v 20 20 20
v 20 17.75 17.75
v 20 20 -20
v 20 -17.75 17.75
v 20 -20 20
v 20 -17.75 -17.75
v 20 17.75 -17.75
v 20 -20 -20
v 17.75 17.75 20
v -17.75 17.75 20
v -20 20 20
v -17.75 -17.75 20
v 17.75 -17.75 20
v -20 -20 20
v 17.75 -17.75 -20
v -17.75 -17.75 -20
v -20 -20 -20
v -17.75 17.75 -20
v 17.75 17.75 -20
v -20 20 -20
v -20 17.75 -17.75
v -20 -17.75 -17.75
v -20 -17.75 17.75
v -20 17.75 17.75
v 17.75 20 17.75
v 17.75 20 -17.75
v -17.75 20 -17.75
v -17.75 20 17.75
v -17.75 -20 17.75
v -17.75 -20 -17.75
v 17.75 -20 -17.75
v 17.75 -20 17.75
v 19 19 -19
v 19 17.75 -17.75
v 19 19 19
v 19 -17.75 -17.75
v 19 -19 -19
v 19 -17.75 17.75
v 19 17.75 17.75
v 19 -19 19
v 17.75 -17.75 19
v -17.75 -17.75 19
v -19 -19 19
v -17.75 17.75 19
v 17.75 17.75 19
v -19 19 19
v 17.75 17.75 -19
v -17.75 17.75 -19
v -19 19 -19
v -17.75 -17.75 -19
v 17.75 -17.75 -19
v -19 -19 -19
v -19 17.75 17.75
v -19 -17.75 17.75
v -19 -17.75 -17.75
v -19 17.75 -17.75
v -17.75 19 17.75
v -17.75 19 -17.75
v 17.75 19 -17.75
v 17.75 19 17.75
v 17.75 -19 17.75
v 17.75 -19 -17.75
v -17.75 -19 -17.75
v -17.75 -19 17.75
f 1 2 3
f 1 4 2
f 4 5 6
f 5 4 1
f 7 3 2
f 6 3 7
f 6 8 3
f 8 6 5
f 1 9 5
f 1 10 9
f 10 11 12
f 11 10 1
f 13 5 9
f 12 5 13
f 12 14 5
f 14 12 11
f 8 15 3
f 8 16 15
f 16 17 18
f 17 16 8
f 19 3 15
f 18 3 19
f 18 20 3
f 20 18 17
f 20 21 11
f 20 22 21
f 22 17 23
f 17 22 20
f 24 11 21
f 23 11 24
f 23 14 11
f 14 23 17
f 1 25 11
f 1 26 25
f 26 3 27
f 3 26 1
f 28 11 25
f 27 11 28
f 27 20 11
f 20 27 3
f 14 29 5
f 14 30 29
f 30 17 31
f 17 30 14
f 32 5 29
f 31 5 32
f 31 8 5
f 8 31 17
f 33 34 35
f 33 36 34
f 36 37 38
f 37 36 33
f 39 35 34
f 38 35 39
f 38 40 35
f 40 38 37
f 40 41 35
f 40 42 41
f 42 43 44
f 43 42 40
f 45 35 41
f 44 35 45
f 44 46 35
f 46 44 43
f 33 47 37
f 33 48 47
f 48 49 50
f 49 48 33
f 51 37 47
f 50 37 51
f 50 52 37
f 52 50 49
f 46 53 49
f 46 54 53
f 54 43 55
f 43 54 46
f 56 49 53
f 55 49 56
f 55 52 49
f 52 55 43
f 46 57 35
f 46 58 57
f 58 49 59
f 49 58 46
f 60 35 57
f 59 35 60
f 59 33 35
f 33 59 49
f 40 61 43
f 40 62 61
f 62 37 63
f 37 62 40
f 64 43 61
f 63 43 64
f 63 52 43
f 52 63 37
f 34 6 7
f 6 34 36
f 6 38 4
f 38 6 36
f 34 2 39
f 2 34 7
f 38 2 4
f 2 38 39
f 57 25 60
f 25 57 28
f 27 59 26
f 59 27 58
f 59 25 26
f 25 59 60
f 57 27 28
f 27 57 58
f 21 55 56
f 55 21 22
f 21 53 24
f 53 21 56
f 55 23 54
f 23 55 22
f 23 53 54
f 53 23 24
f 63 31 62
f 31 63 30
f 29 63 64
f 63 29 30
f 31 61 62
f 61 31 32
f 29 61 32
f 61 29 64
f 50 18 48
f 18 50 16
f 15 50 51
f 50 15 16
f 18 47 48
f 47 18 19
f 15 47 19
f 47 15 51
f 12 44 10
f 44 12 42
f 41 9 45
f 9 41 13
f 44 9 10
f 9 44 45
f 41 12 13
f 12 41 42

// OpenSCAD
// file: modules.scad
module noir(filename,text)
{
    rotate([0,0,180])
     difference() 
     {   
        union()
        { 
            translate([5,0,0])  cube([35,35,5],center=true); 
//            translate([22.5,0,0])  cube([2,2,5],center=true); 
        }
        translate([3,0,4.6])    scale([0.14,0.14,-0.03])  surface(file = filename, center = true);
        translate([22.0,-7.2,1.5])   rotate([0,0,90])  linear_extrude(4)  text (text, font="Ubuntu Mono:style=Bold", $fn=50,size= 4);
     } 
}

module blanc (filename,text)
{
    rotate([0,0,180])        
    intersection() 
    {    
        translate([5,0,0])  cube([35,35,5],center=true); 
        union(){ 
                translate([3,0,4.6])    scale([0.14,0.14,-0.03])  surface(file = filename, center = true); 
                translate([22.0,-7.2,1.5])   rotate([0,0,90])  linear_extrude(4)  text (text, font="Ubuntu Mono:style=Bold", $fn=50,size= 4); 
        } 
    } 
}

module shape ()
{
    rotate([0,0,180])   translate([5,0,0])  cube([35.5,35.5,5],center=true); 
//    rotate([0,0,180])   translate([22.5,0,0])  cube([2.5,2.5,5],center=true); 
}
// main file
include <modules.scad>


// part = 0 pour la couleur, part = 1 pour le noir, part = 2 pour le blanc
part = 0;
//color([0,0,0])     noir ("Marker100.png","ID=100");
//color([1,1,1])  blanc ("Marker100.png","ID=100");


if (part == 0)
{
    difference()
    {
        cube([40,40,40],center=true);    
        cube([38,38,38],center=true);    
        translate([35/2,0,-5]) rotate([0,90,0])    shape();
        rotate([0,0,90])    translate([35/2,0,-5]) rotate([0,90,0])    shape();
        rotate([0,0,180])    translate([35/2,0,-5]) rotate([0,90,0])    shape();
        rotate([0,0,270])    translate([35/2,0,-5]) rotate([0,90,0])    shape();
        rotate([0,90,0])    translate([35/2,0,-5]) rotate([0,90,0])    shape();
        rotate([0,270,0])    translate([35/2,0,-5]) rotate([0,90,0])    shape();
    }
}

if (part == 1)
{
    // partie noire
    color([0,0,0])      union()
    {
        translate([35/2,0,-5]) rotate([0,90,0])    noir ("Marker10.png","ID=10");
        rotate([0,0,90])    translate([35/2,0,-5]) rotate([0,90,0])    noir ("Marker11.png","ID=11");
        rotate([0,0,180])    translate([35/2,0,-5]) rotate([0,90,0])   noir ("Marker12.png","ID=12");
        rotate([0,0,270])    translate([35/2,0,-5]) rotate([0,90,0])   noir ("Marker13.png","ID=13");
        rotate([0,90,0])    translate([35/2,0,-5]) rotate([0,90,0])    noir ("Marker14.png","ID=14");
        rotate([0,270,0])    translate([35/2,0,-5]) rotate([0,90,0])   noir ("Marker15.png","ID=15");
    }
}

if (part == 2)
{

    // partie blanche
    color([1,1,1])  union()
    {
        translate([35/2,0,-5]) rotate([0,90,0])    blanc ("Marker10.png","ID=10");
        rotate([0,0,90])    translate([35/2,0,-5]) rotate([0,90,0])    blanc ("Marker11.png","ID=11");
        rotate([0,0,180])    translate([35/2,0,-5]) rotate([0,90,0])   blanc ("Marker12.png","ID=12");
        rotate([0,0,270])    translate([35/2,0,-5]) rotate([0,90,0])   blanc ("Marker13.png","ID=13");
        rotate([0,90,0])    translate([35/2,0,-5]) rotate([0,90,0])    blanc ("Marker14.png","ID=14");
        rotate([0,270,0])    translate([35/2,0,-5]) rotate([0,90,0])   blanc ("Marker15.png","ID=15");
    }
}
